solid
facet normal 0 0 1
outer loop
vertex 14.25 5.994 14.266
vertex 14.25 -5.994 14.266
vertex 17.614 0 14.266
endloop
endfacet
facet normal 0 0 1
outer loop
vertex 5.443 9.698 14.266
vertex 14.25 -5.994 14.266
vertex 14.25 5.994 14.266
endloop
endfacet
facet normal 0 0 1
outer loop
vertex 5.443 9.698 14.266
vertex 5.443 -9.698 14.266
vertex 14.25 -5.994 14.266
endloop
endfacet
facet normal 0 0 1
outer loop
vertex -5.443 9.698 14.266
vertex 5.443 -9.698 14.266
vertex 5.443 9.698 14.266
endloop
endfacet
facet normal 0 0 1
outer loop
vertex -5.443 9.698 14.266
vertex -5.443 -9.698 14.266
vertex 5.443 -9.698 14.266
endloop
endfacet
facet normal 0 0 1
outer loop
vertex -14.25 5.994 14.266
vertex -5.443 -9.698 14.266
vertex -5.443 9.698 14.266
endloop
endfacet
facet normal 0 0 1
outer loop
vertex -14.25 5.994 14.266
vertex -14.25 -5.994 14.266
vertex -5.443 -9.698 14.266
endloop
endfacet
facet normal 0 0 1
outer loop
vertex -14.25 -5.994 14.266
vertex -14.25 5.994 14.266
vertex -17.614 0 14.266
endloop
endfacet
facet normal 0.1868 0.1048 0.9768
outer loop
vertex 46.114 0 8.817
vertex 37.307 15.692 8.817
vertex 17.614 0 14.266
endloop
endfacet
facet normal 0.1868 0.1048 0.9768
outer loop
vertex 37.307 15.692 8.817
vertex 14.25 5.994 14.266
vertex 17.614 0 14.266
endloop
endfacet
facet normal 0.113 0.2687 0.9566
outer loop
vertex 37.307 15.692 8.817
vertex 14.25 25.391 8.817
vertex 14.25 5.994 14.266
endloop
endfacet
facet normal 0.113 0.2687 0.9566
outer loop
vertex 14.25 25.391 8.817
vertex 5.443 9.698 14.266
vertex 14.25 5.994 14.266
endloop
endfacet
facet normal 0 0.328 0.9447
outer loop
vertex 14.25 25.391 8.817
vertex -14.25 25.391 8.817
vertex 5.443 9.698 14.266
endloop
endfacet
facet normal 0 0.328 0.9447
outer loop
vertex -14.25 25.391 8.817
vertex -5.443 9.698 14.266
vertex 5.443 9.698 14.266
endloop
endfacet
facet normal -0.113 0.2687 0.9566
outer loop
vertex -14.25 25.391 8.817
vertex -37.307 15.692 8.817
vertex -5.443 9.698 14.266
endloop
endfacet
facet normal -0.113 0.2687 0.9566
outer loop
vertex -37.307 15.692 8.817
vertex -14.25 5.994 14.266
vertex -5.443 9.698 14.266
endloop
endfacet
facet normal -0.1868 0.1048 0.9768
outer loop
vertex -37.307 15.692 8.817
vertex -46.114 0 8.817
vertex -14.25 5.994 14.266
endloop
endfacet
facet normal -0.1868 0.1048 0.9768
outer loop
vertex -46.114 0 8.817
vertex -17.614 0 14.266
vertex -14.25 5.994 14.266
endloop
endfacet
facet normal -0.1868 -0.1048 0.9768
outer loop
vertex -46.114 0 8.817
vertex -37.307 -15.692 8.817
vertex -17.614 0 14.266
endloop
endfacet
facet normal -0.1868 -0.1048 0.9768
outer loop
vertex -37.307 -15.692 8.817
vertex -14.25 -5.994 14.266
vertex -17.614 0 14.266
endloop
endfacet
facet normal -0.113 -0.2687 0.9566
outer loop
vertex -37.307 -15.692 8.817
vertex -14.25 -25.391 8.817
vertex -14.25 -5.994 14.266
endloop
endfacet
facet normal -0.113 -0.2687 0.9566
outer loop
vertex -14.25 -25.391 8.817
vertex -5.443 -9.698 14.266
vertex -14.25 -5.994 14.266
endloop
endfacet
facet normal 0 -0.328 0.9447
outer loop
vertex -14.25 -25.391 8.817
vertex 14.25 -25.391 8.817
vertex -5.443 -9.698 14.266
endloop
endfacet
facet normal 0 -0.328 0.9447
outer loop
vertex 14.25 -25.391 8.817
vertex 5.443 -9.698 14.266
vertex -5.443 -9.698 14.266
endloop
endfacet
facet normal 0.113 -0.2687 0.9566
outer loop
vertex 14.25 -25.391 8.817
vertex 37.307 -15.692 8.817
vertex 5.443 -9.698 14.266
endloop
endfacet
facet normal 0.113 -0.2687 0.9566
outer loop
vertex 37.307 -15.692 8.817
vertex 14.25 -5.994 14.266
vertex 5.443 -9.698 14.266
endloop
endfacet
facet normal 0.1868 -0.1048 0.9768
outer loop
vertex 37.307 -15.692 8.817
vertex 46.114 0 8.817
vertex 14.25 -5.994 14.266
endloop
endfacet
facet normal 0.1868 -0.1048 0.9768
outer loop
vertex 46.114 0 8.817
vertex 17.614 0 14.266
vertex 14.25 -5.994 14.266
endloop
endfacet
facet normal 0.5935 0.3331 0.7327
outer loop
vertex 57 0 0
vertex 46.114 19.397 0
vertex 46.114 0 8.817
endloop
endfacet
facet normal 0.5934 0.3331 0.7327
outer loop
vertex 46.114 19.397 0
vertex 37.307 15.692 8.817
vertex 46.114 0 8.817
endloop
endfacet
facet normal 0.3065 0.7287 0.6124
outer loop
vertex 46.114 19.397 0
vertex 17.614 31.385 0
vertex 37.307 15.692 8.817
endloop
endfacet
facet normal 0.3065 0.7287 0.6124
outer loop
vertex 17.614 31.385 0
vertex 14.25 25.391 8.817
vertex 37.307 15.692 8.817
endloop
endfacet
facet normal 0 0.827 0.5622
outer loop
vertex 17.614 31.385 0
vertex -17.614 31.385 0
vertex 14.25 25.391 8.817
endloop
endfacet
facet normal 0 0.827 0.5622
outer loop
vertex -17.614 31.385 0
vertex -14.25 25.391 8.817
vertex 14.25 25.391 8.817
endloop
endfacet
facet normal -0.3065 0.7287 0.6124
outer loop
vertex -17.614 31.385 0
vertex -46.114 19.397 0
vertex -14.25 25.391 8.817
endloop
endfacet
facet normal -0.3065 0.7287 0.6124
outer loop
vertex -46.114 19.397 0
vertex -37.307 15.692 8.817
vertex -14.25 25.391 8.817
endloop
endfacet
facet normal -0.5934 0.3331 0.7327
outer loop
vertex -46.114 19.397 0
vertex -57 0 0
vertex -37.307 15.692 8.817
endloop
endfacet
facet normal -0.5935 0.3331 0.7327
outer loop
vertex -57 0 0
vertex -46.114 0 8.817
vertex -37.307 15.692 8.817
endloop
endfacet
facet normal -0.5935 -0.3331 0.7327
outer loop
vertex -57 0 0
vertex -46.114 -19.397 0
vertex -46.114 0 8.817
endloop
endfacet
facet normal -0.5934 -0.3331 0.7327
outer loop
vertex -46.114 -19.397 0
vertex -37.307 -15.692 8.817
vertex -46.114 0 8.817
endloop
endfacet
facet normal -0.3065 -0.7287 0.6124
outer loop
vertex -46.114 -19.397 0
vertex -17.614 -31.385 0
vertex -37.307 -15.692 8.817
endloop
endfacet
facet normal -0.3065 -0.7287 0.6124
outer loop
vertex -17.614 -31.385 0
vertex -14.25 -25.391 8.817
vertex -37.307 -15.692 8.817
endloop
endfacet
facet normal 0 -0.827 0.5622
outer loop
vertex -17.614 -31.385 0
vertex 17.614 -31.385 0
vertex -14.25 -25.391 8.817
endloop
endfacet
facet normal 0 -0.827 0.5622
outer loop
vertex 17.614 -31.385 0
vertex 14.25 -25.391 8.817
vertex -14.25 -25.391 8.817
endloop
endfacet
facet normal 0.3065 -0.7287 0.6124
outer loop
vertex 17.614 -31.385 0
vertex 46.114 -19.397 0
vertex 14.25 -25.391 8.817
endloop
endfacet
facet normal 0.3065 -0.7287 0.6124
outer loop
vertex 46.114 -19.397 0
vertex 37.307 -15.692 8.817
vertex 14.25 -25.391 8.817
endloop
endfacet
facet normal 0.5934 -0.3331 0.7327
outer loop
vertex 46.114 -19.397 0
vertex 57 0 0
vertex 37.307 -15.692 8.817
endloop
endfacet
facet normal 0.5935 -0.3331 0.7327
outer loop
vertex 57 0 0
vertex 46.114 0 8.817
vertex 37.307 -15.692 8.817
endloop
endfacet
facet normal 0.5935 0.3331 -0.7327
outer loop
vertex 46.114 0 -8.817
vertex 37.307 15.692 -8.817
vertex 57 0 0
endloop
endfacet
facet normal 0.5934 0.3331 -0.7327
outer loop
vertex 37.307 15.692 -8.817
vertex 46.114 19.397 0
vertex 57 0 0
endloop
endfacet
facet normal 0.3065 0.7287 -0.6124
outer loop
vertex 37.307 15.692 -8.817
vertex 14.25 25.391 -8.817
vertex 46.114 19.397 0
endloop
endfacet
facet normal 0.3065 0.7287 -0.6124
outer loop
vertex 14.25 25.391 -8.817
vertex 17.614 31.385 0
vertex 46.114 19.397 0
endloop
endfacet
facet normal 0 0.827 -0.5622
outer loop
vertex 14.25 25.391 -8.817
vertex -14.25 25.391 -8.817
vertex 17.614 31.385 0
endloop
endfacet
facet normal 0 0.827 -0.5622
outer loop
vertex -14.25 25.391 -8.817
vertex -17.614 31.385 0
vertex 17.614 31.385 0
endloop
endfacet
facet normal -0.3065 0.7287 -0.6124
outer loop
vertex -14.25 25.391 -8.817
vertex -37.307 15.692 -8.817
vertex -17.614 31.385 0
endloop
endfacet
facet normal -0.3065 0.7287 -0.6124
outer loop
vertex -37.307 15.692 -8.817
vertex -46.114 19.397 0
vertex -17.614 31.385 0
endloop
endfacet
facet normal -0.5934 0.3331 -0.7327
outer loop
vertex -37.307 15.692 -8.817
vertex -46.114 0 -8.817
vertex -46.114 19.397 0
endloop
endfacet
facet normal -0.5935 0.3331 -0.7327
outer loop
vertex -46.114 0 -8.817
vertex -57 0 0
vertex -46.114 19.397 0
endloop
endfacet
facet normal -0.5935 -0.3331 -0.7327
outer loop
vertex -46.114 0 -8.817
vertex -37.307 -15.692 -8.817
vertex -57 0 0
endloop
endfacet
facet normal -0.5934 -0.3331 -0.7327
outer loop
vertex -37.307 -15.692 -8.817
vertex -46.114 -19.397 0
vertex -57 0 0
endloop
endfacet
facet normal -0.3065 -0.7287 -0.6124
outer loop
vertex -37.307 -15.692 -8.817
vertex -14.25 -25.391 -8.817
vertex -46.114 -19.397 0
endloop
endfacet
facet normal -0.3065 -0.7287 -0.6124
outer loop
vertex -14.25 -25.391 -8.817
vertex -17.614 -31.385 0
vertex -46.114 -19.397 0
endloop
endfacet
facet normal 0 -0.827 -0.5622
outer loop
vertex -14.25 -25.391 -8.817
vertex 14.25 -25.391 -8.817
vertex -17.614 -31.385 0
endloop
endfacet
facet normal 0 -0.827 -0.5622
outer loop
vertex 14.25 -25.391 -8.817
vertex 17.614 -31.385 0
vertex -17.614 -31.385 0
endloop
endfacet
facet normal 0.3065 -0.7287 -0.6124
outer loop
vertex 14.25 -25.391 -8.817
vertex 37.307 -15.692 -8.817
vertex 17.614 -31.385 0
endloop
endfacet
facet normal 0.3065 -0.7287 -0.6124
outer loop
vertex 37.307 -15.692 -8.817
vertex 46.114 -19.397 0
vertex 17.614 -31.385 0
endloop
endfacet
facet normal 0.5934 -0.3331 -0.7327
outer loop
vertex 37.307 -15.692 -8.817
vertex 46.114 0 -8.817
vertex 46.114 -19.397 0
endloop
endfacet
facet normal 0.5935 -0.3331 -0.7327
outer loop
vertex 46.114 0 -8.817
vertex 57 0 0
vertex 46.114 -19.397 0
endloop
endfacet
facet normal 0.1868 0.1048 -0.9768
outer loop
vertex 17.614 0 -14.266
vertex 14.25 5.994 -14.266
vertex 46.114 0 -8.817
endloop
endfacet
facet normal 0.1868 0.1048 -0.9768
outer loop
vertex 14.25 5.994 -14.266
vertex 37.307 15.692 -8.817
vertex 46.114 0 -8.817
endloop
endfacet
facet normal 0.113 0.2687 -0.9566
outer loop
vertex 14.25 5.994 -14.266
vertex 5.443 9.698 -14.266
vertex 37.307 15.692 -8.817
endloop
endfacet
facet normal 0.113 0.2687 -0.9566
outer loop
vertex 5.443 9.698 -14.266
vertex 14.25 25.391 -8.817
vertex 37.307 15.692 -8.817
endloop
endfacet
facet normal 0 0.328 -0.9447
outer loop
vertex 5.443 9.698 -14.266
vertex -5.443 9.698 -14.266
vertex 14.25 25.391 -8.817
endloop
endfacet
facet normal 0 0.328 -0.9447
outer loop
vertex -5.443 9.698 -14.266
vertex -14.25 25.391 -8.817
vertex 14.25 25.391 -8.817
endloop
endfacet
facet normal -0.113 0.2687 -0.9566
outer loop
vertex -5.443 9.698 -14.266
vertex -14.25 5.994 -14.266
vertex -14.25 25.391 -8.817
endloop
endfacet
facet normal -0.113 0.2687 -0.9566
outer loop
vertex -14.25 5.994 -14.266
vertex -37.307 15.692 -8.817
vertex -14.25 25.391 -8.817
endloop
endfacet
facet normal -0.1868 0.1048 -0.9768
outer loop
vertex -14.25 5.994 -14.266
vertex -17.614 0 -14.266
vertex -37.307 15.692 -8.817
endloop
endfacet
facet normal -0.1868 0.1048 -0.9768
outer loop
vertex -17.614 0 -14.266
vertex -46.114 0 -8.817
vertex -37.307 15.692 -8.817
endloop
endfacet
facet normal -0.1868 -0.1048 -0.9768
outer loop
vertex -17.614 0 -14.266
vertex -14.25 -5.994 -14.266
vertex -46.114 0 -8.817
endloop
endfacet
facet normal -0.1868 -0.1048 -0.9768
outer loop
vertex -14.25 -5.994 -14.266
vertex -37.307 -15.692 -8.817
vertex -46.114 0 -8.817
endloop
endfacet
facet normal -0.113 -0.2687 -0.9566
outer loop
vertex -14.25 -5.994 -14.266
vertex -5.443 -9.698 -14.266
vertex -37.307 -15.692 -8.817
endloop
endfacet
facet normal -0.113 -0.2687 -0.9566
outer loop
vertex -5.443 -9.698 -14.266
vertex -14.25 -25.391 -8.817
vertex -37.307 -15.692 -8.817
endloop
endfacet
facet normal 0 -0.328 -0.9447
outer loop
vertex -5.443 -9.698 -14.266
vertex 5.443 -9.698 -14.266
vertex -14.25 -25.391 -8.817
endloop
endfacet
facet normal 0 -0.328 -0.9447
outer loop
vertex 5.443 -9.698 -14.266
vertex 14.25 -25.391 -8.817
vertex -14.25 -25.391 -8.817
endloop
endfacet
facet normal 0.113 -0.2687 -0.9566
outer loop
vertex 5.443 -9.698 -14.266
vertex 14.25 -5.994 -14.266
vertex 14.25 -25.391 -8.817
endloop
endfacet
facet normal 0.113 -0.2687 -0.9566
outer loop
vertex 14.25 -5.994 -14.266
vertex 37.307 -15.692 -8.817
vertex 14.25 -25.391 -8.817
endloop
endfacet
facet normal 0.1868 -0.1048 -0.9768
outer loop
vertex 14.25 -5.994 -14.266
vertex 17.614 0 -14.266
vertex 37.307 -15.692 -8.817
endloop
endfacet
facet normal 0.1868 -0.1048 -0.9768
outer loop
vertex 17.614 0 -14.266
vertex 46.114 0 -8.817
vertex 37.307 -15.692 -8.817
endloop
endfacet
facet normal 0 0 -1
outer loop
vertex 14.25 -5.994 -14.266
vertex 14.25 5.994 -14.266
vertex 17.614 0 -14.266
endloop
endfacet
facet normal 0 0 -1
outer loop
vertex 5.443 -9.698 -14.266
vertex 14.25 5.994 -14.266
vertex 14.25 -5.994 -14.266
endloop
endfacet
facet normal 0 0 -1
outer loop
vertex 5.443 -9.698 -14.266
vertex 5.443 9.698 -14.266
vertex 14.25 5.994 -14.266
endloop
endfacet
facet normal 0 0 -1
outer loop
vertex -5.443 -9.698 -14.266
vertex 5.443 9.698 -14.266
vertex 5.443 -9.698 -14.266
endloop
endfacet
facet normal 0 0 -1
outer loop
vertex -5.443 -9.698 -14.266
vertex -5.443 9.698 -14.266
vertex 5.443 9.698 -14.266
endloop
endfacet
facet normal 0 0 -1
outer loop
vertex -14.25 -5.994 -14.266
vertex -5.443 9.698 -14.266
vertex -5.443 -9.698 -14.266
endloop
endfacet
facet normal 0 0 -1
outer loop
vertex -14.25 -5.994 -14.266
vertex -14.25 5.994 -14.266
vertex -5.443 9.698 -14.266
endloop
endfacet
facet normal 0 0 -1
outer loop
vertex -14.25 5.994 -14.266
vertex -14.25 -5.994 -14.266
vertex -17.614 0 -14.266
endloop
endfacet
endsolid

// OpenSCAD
// Generated by SolidPython 1.0.1 on 2020-07-29 00:46:54


scale(v = [19, 11, 5]) {
	sphere(r = 3);
}
/***********************************************
*********      SolidPython code:      **********
************************************************
 
# import packages: SolidPython
from solid import *
from solid.utils import *
from itertools import chain, combinations, permutations


class Resize:

    def __init__(self, scad_file):
        self.scad_file = scad_file
        #self.scad_file = import_scad(scad_file)
        # cone/cylinder param:
        self.r1 = 0
        self.r2 = 0
        self.h = 0
        # rectangular prism param:
        self.w = 0
        self.l = 0
        # ellipse param:
        self.r = 0

    # import OpenScad code (file name corresponds to shape)


    # classify shape + parameters
    def assign(self, param1, param2, param3):
        if self.scad_file == 'cone.scad':
            self.r1 = param1
            self.r2 = param2
            self.h = param3
        elif self.scad_file == 'cylinder.scad':
            self.r1 = param1
            self.r2 = param2
            self.h = param3
        elif self.scad_file == 'rectangularPrism.scad':
            self.h = param1
            self.l = param2
            self.w = param3
        else:
            self.r = param1
            self.h = param2

    # resize parameters
    def iterate(self):
        x = range(3, 20, 2)
        i = 1
        if self.scad_file == 'cone.scad':
            tempList = list(permutations(x, 2))
            for temp in tempList:
                param1 = temp[0]
                param2 = temp[1]
                filepath = 'produced_scad_files/' + 'cone' + str(param1) + '_' + str(param2) + '_' + '.scad'
                scad_render_to_file(cylinder(h=param1, r1=param2, r2=0), filepath)

        elif self.scad_file == 'cylinder.scad':
            tempList = list(permutations(x, 3))
            for temp in tempList:
                param1 = temp[0]
                param2 = temp[1]
                filepath = 'produced_scad_files/' + 'cylinder' + str(param1) + '_' + str(param2) + '_' + '.scad'
                scad_render_to_file(cylinder(h=param1, r1=param2, r2=param2), filepath)

        elif self.scad_file == 'rectangularPrism.scad':
            tempList = list(permutations(x, 3))
            for temp in tempList:
                param1 = temp[0]
                param2 = temp[1]
                param3 = temp[2]
                filepath = 'produced_scad_files/' + 'rectangularPrism' + str(param1) + '_' + str(param2) + '_' + str(
                    param3) + '.scad'
                scad_render_to_file(cube(size=(param1, param2, param3)), filepath)

        elif self.scad_file == 'ellipse.scad':
            tempList = list(permutations(x, 4))
            for temp in tempList:
                param1 = temp[0]
                param2 = temp[1]
                param3 = temp[2]
                param4 = temp[3]
                filepath = 'produced_scad_files/' + 'ellipse' + str(param1) + '_' + str(param2) + '_' + str(param3) + '_' + str(param4) + '.scad'
                scad_render_to_file(scale([param1, param2, param3])(sphere(r=param4)), filepath)

    def render_to_scadfile(self):
        scad_render_to_file(scad, 'example.scad') 
 
************************************************/
